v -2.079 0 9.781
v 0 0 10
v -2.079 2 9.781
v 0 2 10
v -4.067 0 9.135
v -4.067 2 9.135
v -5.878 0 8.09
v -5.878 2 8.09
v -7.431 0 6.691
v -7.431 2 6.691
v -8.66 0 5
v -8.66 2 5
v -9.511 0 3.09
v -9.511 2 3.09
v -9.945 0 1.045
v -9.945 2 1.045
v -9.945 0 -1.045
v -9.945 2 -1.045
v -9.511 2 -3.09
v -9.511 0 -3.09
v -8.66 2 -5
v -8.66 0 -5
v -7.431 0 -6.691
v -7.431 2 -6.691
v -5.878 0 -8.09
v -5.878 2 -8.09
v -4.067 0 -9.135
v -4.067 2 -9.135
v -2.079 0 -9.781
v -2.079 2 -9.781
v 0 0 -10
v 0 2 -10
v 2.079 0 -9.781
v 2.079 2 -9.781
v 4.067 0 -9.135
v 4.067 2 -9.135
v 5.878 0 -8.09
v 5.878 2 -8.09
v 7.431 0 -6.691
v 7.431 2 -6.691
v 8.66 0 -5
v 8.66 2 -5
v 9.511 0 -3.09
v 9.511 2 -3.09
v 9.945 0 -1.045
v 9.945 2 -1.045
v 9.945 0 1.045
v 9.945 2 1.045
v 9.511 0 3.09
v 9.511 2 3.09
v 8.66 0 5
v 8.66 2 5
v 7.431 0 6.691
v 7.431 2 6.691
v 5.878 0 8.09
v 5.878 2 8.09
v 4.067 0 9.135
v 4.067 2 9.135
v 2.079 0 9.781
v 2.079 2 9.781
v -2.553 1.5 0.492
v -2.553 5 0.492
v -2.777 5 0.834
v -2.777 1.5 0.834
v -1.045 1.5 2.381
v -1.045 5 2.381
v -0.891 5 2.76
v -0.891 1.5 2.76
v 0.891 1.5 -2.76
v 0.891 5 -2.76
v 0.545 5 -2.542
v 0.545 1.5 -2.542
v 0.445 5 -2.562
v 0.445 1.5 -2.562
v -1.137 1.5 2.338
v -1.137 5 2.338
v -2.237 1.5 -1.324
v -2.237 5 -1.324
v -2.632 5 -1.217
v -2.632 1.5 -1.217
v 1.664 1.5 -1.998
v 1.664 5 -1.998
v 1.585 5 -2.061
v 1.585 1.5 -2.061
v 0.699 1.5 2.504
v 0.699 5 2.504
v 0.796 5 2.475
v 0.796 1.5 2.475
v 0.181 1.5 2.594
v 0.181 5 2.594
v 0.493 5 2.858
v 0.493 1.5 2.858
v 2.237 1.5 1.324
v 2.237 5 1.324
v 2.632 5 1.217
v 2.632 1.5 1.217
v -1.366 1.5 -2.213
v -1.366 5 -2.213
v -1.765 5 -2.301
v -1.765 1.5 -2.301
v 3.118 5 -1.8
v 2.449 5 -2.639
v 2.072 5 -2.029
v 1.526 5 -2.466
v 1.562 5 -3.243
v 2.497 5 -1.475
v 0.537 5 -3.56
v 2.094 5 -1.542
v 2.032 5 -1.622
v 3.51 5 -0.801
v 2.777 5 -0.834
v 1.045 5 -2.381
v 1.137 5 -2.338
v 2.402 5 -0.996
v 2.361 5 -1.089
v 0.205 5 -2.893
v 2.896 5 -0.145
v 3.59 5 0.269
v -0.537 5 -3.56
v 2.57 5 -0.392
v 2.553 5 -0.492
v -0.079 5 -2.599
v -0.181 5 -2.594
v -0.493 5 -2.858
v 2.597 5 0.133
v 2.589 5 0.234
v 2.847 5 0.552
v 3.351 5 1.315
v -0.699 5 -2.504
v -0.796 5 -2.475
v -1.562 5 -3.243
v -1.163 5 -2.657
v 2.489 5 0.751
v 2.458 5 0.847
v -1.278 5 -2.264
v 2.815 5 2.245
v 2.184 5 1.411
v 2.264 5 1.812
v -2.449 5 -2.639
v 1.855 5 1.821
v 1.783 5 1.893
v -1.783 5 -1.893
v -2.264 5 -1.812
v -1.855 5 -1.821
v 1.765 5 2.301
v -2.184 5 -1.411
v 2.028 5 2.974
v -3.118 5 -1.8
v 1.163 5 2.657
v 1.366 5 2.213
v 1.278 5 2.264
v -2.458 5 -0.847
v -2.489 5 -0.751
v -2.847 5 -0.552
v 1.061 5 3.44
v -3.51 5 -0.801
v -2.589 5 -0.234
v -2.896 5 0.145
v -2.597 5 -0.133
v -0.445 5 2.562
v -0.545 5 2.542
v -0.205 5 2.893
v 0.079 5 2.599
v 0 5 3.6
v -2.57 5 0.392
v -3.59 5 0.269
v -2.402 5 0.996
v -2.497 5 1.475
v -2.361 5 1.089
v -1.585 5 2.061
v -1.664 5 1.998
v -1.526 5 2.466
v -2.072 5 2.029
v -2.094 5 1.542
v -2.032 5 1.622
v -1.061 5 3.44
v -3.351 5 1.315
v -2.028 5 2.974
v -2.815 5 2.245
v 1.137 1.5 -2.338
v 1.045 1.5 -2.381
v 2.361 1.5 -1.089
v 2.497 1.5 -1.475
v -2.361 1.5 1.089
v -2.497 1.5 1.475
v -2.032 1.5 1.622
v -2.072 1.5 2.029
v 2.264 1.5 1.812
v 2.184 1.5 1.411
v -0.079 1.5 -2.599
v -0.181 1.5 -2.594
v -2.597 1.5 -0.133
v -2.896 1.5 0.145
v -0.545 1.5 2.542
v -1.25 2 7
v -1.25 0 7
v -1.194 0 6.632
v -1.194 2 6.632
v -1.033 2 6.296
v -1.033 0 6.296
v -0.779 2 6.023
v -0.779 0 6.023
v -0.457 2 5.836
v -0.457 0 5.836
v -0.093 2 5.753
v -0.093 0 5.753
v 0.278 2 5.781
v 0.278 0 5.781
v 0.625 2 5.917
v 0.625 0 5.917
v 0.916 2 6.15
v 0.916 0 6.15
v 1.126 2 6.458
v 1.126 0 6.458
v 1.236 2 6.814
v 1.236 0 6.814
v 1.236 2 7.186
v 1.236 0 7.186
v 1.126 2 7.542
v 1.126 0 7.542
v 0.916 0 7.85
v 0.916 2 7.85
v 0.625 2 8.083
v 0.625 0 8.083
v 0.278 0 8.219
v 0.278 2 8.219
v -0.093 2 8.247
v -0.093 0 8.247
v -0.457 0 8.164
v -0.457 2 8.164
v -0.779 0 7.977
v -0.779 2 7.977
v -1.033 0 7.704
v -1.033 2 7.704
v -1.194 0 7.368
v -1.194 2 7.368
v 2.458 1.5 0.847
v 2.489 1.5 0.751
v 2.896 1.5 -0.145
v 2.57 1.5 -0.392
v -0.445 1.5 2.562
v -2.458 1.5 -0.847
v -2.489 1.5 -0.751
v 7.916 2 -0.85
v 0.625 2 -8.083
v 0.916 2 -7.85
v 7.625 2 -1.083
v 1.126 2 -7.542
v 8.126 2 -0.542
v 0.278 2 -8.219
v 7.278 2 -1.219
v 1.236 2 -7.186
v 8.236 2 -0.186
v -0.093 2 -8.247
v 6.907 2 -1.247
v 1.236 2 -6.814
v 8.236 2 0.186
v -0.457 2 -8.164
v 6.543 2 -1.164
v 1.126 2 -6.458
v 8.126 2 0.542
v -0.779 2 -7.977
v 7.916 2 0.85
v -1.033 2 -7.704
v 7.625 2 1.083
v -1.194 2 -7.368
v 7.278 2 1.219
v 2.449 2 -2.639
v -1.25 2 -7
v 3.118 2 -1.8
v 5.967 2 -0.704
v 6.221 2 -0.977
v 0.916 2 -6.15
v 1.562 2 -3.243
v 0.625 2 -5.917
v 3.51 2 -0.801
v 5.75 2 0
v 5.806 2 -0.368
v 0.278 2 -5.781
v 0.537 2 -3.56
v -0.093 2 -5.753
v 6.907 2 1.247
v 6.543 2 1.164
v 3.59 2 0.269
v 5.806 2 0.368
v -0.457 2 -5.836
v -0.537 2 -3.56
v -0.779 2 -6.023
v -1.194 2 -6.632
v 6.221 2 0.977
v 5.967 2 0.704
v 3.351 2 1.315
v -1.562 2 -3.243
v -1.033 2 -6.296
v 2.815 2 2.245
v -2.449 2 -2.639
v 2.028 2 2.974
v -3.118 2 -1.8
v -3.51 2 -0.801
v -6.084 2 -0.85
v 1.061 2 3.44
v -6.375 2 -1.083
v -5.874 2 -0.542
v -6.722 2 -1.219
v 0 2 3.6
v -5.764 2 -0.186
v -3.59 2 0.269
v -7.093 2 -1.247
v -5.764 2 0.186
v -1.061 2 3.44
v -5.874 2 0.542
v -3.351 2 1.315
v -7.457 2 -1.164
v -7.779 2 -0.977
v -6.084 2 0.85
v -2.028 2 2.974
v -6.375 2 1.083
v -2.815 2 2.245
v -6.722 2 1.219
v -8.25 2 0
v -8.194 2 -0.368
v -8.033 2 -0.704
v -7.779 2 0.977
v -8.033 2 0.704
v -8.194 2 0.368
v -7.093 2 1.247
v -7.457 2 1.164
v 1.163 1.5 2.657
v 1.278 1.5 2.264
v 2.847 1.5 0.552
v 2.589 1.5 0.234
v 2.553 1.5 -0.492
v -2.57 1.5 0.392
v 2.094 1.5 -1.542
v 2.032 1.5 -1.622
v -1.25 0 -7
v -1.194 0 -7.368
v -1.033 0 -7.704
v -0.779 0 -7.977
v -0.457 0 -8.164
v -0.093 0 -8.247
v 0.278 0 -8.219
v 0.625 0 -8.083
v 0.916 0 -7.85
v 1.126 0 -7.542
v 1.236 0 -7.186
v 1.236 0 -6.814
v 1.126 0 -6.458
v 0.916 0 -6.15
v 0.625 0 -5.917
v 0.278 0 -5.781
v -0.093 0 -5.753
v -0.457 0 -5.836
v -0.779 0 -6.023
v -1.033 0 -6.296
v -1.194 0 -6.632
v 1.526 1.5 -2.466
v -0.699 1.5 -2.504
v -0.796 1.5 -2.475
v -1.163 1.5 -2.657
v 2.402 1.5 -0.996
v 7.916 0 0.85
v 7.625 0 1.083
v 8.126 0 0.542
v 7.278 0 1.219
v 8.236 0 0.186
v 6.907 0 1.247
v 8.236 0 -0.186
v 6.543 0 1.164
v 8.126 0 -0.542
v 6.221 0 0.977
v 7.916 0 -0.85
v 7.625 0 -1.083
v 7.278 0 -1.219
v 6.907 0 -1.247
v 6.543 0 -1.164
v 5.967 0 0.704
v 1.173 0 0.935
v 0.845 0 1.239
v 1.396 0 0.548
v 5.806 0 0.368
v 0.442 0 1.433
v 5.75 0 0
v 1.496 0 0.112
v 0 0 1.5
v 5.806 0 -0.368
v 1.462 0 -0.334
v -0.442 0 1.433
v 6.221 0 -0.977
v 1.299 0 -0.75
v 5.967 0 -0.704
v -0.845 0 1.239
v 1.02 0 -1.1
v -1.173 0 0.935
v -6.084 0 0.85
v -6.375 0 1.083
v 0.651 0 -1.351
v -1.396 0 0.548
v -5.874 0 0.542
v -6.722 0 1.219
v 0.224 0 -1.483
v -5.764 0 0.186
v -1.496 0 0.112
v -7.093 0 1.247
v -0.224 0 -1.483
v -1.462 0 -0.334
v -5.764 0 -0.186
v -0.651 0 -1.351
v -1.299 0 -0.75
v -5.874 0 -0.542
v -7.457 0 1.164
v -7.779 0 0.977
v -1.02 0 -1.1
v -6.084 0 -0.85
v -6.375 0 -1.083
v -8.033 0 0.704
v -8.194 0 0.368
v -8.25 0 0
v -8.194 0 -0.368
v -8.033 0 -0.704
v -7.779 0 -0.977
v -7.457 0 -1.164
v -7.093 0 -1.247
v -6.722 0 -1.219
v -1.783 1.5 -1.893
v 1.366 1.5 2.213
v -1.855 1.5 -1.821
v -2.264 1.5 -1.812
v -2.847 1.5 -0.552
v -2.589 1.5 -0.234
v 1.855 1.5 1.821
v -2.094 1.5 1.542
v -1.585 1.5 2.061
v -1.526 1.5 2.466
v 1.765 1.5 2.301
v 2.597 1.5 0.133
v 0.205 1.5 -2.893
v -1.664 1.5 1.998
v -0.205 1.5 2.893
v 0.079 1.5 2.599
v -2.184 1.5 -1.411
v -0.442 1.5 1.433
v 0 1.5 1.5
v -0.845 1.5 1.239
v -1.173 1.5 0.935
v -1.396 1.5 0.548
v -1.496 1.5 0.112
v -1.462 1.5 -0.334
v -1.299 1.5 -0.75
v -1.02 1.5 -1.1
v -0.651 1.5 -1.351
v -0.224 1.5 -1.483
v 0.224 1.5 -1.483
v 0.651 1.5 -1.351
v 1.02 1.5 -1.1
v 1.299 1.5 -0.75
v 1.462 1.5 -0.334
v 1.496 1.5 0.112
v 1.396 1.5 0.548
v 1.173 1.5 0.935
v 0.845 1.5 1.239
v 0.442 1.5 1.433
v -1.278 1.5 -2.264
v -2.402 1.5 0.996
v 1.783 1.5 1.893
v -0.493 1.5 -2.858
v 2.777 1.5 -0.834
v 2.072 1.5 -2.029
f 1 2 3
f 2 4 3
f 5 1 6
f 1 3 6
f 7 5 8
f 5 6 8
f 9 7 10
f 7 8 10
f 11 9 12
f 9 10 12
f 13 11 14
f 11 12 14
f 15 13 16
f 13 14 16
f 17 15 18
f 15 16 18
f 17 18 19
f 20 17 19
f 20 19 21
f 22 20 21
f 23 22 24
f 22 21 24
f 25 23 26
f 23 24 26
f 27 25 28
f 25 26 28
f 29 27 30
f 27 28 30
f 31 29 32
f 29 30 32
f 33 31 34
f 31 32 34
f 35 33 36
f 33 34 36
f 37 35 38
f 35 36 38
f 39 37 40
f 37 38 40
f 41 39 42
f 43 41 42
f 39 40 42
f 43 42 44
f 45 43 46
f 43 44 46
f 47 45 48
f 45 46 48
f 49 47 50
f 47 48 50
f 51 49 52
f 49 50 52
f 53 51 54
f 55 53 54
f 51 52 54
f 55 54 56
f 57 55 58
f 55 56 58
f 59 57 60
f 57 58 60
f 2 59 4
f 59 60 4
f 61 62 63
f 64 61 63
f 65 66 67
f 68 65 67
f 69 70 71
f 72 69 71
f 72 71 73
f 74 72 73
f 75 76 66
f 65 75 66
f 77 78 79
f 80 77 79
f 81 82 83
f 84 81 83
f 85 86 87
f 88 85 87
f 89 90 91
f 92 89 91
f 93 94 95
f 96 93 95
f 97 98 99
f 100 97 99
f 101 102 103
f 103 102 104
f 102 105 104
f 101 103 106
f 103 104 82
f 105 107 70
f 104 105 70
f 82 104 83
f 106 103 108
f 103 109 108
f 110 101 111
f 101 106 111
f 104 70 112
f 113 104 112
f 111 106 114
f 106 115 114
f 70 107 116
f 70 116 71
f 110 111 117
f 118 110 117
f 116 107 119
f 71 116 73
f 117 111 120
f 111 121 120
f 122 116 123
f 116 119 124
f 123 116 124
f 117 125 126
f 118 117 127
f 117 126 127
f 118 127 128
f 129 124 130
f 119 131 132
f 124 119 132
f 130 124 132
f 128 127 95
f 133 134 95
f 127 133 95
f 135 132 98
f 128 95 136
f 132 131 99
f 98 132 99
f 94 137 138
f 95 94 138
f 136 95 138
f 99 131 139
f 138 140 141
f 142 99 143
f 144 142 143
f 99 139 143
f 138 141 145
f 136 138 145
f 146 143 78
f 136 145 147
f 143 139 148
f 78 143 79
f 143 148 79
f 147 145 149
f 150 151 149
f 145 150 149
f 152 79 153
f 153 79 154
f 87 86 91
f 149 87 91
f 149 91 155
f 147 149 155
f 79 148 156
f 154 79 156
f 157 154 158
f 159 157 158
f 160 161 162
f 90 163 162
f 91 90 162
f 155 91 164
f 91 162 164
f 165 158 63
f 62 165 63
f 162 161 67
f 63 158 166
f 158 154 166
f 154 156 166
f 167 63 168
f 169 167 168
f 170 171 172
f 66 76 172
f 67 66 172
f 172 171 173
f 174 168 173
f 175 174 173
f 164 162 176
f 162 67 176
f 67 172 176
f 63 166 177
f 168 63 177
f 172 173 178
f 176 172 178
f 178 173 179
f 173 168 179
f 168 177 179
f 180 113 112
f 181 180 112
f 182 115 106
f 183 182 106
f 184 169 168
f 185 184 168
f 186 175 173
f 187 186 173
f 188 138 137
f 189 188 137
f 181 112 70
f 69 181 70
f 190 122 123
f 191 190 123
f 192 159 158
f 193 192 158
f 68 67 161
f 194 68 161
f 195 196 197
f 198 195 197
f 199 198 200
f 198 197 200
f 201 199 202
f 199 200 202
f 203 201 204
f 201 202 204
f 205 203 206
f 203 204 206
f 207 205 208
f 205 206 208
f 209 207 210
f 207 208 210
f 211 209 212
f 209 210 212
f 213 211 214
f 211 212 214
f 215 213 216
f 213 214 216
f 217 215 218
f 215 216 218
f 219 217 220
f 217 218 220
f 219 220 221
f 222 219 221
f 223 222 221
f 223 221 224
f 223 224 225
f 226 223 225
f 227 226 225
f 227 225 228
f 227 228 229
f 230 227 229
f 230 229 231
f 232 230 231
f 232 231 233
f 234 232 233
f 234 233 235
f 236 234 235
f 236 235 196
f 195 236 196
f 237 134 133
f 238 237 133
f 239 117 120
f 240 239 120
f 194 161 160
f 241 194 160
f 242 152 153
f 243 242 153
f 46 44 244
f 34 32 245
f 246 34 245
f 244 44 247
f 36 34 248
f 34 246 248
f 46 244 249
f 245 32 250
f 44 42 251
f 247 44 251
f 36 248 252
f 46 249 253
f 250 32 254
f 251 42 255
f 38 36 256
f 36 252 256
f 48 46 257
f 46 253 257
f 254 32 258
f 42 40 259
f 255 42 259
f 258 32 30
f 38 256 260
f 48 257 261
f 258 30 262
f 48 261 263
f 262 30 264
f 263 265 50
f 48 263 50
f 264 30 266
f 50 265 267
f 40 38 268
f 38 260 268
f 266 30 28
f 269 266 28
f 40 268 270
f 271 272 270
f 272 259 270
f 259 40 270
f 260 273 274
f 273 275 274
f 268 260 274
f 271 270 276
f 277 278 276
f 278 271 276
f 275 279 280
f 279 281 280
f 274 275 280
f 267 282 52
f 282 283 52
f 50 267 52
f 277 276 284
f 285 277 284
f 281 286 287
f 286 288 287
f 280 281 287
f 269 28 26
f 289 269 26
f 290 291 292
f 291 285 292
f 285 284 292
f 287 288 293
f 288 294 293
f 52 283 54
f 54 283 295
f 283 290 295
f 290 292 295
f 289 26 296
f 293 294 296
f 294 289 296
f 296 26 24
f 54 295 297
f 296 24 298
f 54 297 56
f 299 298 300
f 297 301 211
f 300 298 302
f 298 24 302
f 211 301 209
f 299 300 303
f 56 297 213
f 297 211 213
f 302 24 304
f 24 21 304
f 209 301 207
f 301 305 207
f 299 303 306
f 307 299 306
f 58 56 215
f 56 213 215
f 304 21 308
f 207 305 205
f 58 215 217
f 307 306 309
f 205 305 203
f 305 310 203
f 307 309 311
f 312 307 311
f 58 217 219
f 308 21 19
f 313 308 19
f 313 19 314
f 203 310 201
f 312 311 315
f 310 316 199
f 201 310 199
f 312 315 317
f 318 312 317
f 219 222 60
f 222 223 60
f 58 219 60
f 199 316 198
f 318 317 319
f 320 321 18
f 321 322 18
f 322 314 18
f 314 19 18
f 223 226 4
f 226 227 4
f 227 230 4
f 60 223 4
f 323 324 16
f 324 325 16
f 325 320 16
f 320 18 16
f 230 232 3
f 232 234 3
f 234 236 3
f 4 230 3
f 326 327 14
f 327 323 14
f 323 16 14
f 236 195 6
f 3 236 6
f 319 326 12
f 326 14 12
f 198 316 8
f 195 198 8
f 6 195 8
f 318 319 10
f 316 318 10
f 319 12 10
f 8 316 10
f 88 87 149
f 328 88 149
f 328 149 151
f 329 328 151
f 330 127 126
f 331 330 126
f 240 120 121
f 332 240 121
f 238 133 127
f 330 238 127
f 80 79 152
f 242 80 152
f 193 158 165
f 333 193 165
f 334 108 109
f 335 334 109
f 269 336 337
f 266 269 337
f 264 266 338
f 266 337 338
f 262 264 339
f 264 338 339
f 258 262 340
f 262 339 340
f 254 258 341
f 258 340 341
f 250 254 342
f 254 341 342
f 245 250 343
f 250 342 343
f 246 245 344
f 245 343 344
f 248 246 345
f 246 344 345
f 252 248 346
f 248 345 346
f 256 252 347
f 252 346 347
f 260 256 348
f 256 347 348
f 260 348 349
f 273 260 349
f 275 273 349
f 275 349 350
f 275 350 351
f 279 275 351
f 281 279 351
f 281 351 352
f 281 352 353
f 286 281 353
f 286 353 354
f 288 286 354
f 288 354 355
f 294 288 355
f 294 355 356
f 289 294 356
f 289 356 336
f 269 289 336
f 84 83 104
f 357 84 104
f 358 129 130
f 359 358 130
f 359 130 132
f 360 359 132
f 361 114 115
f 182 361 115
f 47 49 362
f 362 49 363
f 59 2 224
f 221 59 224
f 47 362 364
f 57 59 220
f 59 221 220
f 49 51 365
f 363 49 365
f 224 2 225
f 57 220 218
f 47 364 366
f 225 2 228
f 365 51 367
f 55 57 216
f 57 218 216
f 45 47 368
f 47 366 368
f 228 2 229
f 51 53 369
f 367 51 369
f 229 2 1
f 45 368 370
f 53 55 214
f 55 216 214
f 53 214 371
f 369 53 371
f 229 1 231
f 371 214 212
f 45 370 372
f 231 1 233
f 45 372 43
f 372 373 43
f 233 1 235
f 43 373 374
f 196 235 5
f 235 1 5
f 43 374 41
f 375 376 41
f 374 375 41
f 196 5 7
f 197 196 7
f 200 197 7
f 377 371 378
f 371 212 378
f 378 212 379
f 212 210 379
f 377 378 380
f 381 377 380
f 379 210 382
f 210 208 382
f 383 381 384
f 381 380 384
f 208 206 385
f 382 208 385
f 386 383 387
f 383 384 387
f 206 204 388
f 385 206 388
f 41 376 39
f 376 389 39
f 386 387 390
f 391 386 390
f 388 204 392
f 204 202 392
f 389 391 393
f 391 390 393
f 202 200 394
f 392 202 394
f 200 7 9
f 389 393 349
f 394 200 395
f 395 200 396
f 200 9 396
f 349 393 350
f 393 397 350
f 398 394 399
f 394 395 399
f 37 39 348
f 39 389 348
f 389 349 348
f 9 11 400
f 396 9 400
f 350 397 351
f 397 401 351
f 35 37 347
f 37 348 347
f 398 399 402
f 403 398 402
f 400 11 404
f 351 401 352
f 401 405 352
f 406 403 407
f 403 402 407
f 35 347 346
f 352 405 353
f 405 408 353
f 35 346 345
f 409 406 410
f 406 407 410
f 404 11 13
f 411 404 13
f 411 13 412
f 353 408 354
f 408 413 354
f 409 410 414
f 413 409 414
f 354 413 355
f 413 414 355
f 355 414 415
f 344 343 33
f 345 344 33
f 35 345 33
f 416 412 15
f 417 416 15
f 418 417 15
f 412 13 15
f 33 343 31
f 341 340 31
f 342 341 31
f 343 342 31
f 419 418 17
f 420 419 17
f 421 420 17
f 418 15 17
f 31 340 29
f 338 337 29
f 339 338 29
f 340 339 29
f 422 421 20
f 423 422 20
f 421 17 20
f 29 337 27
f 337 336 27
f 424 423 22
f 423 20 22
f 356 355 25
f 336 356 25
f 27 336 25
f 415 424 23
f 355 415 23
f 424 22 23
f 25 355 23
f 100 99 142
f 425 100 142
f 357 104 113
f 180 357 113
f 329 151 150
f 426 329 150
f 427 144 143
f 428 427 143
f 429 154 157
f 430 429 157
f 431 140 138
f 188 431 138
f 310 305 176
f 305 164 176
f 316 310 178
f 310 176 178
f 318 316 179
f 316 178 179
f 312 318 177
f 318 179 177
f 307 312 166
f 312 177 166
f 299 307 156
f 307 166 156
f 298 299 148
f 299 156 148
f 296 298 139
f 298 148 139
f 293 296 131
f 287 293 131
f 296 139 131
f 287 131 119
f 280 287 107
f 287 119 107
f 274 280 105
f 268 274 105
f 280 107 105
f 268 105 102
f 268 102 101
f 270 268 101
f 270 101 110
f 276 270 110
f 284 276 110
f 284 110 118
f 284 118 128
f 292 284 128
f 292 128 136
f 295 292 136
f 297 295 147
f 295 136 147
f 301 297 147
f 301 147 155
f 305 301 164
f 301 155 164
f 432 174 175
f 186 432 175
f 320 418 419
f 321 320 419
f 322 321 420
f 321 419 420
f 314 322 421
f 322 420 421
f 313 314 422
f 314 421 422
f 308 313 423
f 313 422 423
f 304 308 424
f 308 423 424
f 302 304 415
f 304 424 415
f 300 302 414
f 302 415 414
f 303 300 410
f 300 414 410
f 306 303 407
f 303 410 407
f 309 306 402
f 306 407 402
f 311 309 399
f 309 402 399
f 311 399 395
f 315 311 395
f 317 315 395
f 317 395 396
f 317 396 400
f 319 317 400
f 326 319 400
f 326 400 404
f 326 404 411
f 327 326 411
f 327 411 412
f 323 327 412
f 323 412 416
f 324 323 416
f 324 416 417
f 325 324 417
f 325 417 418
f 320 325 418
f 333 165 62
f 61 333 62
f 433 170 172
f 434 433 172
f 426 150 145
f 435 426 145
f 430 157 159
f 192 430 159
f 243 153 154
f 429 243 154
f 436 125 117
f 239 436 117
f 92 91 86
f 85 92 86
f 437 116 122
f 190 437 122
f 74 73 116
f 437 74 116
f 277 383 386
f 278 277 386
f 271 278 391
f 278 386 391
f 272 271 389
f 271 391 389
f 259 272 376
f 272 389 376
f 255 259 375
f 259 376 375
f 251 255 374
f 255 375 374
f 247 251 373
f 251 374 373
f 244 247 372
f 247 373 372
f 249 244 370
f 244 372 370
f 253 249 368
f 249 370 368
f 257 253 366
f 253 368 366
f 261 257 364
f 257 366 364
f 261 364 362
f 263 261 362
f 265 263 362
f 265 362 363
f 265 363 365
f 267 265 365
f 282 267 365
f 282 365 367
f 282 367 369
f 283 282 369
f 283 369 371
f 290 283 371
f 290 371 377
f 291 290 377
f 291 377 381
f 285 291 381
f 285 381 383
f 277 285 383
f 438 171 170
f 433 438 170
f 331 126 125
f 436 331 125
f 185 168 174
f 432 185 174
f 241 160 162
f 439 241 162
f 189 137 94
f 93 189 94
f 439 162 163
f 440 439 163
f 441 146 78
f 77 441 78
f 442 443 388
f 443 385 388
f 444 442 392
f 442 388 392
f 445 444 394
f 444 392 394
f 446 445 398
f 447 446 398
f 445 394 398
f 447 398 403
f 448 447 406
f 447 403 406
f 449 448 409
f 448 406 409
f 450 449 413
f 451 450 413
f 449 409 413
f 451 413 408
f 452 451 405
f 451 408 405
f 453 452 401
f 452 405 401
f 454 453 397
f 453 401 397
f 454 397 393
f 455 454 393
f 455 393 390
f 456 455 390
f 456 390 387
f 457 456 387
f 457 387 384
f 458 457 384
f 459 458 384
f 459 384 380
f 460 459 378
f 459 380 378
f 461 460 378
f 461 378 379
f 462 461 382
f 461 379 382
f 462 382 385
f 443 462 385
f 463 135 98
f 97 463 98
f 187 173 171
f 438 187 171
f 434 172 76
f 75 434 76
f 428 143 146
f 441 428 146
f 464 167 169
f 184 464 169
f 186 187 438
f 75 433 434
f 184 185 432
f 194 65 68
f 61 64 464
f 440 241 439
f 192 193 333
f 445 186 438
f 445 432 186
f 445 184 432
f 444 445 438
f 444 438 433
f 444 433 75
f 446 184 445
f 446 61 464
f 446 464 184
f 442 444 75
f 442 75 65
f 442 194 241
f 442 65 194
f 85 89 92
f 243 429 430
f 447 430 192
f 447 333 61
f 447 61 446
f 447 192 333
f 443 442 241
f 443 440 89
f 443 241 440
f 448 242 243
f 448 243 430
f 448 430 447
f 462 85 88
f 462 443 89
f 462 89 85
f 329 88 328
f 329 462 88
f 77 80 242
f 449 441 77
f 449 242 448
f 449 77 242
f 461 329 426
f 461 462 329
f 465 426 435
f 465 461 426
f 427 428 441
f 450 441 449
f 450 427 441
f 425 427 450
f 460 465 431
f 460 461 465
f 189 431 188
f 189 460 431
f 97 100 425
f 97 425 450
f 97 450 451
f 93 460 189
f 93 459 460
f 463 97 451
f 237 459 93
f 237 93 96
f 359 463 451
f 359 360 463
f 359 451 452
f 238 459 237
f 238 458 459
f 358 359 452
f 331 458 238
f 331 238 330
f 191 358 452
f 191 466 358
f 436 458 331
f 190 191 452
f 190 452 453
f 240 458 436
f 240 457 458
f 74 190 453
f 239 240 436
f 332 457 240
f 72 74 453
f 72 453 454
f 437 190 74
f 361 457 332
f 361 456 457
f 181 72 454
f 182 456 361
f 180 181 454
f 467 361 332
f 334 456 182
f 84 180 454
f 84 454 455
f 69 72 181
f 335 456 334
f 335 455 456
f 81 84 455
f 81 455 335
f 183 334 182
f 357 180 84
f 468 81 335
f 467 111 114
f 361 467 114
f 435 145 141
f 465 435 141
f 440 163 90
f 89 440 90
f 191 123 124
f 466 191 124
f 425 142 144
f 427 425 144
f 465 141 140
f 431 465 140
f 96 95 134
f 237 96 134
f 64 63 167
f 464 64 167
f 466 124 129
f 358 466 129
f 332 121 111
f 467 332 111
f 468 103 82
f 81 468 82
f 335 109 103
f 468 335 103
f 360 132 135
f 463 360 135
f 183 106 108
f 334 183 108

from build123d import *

# Parameters (mm, degrees)
M3_TAPPED_HOLE1_D  = 2.5
CUT_EXTRUDE1_DEPTH = 3.5


with BuildPart() as part:
    # Sketch1 → Revolve1 (revolve)
    with BuildSketch(Plane.XY, mode=Mode.PRIVATE) as revolve1_sk:
        Polygon((2.345142076, 2), (1.5, 2), (1.5, 0), (10, 0), (10, 2), (3.6, 2), (3.6, 5), (2.345142076, 5), align=None)
    revolve(revolve1_sk.sketch.rotate(Axis((0, 6.795271061, 0), (0, -1, 0)), 90), axis=Axis((0, 6.795271061, 0), (0, -1, 0)))

    # M3 Tapped Hole1 (through all)
    with Locations(Plane(origin=(0, 2, 0), x_dir=(1, 0, 0), z_dir=(0, 1, 0))):
        with Locations((-7, 0), (0, 7), (7, 0), (0, -7)):
            Hole(M3_TAPPED_HOLE1_D / 2)

    # Sketch5 → Cut-Extrude1 (cut)
    with BuildSketch(Plane(origin=(0, 5, 0), x_dir=(1, 0, 0), z_dir=(0, 1, 0))):
        Polygon((-1.365561553, 2.212519298), (-1.76486465, 2.301141622), (-1.782802347, 1.892515731), (-1.855371341, 1.821427239), (-2.264280127, 1.811914873), (-2.18390601, 1.410870135), (-2.237353692, 1.324480448), (-2.632103873, 1.217386217), (-2.458088994, 0.847229896), (-2.489309178, 0.750559669), (-2.846959309, 0.552107499), (-2.589416781, 0.234351734), (-2.596595063, 0.133019089), (-2.896359819, -0.1452577), (-2.570257076, -0.392146098), (-2.552976281, -0.492252076), (-2.777434424, -0.834181049), (-2.401723373, -0.995853825), (-2.360987798, -1.08891534), (-2.497094635, -1.474624828), (-2.093610237, -1.541686147), (-2.031787285, -1.622294803), (-2.071632783, -2.029368772), (-1.663824084, -1.997921274), (-1.584506681, -2.061392388), (-1.525775164, -2.466173179), (-1.137342523, -2.338044479), (-1.045140308, -2.380689341), (-0.891245038, -2.759652566), (-0.544762749, -2.542289037), (-0.445034179, -2.561629282), (-0.20491899, -2.892750976), (0.079476656, -2.598784997), (0.180935719, -2.593696641), (0.493316205, -2.857733214), (0.699097167, -2.504249019), (0.79639029, -2.475027779), (1.162881655, -2.656634385), (1.278088691, -2.264175191), (1.365561553, -2.212519298), (1.76486465, -2.301141622), (1.782802347, -1.892515731), (1.855371341, -1.821427239), (2.264280127, -1.811914873), (2.18390601, -1.410870135), (2.237353692, -1.324480448), (2.632103873, -1.217386217), (2.458088994, -0.847229896), (2.489309178, -0.750559669), (2.846959309, -0.552107499), (2.589416781, -0.234351734), (2.596595063, -0.133019089), (2.896359819, 0.1452577), (2.570257076, 0.392146098), (2.552976281, 0.492252076), (2.777434424, 0.834181049), (2.401723373, 0.995853825), (2.360987798, 1.08891534), (2.497094635, 1.474624828), (2.093610237, 1.541686147), (2.031787285, 1.622294803), (2.071632783, 2.029368772), (1.663824084, 1.997921274), (1.584506681, 2.061392388), (1.525775164, 2.466173179), (1.137342523, 2.338044479), (1.045140308, 2.380689341), (0.891245038, 2.759652566), (0.544762749, 2.542289037), (0.445034179, 2.561629282), (0.20491899, 2.892750976), (-0.079476656, 2.598784997), (-0.180935719, 2.593696641), (-0.493316205, 2.857733214), (-0.699097167, 2.504249019), (-0.79639029, 2.475027779), (-1.162881655, 2.656634385), (-1.278088691, 2.264175191), align=None)
    extrude(amount=-CUT_EXTRUDE1_DEPTH, mode=Mode.SUBTRACT)


solid = part.part
